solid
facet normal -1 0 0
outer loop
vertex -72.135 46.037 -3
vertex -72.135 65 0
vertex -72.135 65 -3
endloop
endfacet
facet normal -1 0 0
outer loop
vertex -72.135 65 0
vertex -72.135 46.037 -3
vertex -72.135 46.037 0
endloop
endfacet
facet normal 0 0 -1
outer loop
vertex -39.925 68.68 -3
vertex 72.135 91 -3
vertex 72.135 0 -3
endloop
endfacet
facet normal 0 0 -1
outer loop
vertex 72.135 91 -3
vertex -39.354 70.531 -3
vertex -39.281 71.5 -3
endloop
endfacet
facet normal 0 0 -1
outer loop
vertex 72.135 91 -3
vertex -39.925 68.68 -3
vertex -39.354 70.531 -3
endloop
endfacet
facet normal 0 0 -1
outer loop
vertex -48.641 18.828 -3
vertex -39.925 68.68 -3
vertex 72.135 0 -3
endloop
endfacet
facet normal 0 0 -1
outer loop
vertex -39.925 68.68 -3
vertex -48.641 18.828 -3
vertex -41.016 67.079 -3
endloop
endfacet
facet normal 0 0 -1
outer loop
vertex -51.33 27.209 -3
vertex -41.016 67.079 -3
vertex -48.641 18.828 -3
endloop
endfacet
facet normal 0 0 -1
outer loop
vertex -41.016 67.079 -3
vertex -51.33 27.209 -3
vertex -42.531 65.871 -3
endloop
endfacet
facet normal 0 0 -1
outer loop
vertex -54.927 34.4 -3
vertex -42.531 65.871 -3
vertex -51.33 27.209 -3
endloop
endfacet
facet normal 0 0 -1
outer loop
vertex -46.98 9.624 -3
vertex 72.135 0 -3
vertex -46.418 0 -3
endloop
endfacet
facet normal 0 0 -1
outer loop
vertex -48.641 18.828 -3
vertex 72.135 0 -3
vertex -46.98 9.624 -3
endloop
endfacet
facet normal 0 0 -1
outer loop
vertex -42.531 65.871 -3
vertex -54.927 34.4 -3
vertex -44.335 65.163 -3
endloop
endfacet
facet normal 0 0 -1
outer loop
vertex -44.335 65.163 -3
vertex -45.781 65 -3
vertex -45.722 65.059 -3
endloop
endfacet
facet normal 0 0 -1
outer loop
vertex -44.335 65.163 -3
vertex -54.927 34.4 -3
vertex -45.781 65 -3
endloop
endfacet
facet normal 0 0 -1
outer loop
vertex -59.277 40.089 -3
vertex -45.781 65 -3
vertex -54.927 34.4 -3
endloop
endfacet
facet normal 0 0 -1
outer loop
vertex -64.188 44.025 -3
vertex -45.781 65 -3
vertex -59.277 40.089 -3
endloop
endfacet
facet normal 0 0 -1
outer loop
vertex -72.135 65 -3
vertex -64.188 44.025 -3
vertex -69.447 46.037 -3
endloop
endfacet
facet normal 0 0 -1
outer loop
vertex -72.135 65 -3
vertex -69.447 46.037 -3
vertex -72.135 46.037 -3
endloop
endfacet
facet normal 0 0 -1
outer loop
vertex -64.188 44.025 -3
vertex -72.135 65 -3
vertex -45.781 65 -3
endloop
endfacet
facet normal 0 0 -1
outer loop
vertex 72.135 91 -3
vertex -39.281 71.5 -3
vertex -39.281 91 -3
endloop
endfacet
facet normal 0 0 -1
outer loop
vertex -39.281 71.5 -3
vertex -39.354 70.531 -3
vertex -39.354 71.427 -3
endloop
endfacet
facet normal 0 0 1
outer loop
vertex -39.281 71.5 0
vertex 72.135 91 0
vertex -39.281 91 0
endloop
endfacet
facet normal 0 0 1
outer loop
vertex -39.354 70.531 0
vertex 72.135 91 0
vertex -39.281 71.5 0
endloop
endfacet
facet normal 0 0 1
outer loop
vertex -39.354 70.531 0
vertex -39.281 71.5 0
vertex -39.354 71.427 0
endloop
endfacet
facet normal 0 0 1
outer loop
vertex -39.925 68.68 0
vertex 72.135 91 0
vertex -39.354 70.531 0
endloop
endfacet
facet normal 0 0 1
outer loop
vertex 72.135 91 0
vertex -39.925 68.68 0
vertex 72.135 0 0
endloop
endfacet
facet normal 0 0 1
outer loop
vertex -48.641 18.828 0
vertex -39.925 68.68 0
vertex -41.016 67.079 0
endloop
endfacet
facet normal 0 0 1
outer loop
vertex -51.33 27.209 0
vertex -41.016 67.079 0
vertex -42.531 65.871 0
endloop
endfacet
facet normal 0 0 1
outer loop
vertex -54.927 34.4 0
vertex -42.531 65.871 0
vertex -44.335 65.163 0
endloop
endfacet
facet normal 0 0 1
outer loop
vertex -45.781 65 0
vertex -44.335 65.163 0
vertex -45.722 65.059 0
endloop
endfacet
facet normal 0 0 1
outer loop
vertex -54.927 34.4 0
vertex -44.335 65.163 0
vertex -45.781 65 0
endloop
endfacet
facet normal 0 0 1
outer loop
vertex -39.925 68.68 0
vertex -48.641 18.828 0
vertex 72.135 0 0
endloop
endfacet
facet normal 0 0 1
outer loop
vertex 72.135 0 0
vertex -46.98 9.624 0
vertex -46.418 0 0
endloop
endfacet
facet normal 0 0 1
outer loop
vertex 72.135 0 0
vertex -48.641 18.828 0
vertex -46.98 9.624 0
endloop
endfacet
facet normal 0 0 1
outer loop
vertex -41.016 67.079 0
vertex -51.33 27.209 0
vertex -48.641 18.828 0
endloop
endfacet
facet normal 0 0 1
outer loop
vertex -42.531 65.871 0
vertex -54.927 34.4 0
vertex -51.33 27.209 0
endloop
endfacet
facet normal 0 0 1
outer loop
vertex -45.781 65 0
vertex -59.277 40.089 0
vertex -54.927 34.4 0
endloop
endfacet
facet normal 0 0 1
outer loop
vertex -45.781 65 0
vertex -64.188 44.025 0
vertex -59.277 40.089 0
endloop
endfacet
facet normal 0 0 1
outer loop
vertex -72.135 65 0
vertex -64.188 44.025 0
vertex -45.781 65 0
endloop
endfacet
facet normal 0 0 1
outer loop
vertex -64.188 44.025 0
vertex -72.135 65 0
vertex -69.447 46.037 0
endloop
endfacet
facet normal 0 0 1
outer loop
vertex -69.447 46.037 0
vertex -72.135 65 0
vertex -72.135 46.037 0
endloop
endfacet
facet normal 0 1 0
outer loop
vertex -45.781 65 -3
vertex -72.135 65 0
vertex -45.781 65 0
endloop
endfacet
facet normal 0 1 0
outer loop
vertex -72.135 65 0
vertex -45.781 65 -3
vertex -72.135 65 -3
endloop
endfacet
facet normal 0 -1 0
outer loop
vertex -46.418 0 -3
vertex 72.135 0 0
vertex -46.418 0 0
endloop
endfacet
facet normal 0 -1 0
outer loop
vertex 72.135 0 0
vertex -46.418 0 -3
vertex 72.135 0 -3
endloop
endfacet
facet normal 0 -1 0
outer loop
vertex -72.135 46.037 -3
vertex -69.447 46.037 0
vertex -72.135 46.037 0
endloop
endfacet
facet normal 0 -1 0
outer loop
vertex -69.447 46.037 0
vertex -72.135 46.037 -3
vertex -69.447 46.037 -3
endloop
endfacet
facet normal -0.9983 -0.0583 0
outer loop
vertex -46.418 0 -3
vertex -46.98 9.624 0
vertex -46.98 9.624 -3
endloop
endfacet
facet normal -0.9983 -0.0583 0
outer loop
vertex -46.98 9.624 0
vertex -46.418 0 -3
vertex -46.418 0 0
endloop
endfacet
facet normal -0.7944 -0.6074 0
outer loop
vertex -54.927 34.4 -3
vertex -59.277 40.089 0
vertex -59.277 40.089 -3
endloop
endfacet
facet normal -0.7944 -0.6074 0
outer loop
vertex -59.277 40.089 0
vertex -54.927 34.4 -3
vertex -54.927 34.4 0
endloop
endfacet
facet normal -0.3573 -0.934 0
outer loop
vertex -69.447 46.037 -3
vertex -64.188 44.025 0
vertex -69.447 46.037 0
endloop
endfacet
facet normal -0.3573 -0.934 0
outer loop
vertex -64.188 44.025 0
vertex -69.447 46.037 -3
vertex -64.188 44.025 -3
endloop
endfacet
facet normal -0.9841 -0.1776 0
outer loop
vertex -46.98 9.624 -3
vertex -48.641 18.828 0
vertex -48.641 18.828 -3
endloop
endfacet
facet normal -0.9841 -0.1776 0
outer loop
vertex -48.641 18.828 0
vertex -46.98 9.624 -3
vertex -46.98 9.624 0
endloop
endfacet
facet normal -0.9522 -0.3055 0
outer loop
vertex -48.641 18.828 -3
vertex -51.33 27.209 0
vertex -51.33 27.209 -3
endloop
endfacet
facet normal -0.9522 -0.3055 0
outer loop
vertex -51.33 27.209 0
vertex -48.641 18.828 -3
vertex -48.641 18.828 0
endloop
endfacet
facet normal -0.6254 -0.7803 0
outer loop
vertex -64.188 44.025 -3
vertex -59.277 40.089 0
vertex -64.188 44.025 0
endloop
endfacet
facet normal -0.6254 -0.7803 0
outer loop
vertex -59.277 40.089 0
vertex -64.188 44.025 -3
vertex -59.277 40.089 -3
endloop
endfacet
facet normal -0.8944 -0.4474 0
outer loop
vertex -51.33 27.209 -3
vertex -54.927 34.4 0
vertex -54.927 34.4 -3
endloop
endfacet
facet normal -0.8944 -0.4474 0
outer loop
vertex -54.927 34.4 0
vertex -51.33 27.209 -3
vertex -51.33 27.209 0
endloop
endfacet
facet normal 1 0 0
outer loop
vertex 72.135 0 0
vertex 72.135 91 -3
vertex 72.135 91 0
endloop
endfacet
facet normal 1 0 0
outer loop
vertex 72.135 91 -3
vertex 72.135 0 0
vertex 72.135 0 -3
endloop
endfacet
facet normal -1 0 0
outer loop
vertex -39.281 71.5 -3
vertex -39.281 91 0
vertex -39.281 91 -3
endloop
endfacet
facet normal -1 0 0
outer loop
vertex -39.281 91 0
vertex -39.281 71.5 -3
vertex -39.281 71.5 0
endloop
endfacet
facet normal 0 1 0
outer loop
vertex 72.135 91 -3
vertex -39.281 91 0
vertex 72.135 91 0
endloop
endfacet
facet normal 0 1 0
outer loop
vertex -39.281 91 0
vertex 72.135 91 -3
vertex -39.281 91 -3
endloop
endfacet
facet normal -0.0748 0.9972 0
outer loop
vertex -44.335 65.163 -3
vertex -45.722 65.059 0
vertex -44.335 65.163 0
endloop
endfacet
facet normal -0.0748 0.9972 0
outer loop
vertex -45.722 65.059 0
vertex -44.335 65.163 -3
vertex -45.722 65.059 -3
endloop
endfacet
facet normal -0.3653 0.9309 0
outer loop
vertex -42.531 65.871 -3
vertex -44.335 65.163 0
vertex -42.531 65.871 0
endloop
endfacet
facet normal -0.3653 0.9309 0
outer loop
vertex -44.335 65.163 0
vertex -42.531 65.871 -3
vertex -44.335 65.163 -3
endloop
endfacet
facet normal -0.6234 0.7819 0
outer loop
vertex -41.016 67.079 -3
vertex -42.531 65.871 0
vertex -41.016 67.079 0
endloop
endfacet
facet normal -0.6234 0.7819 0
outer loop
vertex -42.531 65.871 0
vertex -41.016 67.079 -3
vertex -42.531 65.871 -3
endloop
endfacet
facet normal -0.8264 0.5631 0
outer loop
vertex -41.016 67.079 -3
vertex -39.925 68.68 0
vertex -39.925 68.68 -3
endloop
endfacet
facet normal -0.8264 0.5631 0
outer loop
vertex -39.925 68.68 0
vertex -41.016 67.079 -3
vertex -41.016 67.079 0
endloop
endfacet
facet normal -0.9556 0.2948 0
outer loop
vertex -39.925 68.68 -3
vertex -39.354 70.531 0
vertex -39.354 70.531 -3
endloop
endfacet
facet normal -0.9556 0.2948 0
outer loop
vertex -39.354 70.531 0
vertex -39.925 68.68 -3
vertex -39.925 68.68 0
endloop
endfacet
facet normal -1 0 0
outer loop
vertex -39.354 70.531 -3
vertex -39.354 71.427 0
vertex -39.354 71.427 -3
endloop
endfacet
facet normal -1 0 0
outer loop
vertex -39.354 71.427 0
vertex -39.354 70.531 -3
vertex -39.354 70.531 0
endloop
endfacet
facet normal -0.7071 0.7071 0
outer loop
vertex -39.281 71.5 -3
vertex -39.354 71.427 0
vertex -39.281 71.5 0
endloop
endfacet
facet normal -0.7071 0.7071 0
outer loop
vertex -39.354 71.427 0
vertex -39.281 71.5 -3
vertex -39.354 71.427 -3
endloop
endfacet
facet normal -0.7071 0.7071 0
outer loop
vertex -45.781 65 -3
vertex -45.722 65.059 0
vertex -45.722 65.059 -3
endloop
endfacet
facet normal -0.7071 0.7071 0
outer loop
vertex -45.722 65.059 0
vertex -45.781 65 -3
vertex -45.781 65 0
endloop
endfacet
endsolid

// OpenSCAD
hand= "left";	//left, right
height = 3;		//thickness of splint

//Measure strait distances. Just take a plastic ruler and measure. Have a fun:)

//palm sided hand 
front_1 = 35;
front_2 = 26;
front_3 = 65;
front_4 = 37;

//pinkie sided hand
side_1 = 15;
side_2 = 25;
side_3 = 33;

module splint(){

top_length = (side_1 * PI) / 4 + front_1 - side_1 / 2;
middle_length = (side_2 * PI) / 4 + front_1 * 1.5;
bottom_length = (side_3 * PI) / 4 + front_4 - (side_3 / 2);

	
	union(){
		difference(){
			cube([ middle_length, front_3, height]);
			translate([ middle_length, 0, -1]) linear_extrude(height + 2) scale([1, 1.8, 0]) circle(r = middle_length - bottom_length);
		}
		translate([ -middle_length, 0, 0]) cube([ middle_length, front_3, height]);
		translate([ 0, front_3, 0]) cube([ top_length, front_2, height]);
		translate([ -middle_length, front_3, 0]) cube([ middle_length, front_2, height]);

		radius = front_2 / 4;
		linear_extrude(height)
		difference(){
			translate([ top_length, front_3, 0]) polygon([[0,0],[radius,0],[0,radius]]);
			translate([ top_length  + radius, front_3 + radius, 0]) circle(radius);
		}
	}
}

if(hand == "left"){
	rotate([0,180,0]) splint();
}
else splint();
